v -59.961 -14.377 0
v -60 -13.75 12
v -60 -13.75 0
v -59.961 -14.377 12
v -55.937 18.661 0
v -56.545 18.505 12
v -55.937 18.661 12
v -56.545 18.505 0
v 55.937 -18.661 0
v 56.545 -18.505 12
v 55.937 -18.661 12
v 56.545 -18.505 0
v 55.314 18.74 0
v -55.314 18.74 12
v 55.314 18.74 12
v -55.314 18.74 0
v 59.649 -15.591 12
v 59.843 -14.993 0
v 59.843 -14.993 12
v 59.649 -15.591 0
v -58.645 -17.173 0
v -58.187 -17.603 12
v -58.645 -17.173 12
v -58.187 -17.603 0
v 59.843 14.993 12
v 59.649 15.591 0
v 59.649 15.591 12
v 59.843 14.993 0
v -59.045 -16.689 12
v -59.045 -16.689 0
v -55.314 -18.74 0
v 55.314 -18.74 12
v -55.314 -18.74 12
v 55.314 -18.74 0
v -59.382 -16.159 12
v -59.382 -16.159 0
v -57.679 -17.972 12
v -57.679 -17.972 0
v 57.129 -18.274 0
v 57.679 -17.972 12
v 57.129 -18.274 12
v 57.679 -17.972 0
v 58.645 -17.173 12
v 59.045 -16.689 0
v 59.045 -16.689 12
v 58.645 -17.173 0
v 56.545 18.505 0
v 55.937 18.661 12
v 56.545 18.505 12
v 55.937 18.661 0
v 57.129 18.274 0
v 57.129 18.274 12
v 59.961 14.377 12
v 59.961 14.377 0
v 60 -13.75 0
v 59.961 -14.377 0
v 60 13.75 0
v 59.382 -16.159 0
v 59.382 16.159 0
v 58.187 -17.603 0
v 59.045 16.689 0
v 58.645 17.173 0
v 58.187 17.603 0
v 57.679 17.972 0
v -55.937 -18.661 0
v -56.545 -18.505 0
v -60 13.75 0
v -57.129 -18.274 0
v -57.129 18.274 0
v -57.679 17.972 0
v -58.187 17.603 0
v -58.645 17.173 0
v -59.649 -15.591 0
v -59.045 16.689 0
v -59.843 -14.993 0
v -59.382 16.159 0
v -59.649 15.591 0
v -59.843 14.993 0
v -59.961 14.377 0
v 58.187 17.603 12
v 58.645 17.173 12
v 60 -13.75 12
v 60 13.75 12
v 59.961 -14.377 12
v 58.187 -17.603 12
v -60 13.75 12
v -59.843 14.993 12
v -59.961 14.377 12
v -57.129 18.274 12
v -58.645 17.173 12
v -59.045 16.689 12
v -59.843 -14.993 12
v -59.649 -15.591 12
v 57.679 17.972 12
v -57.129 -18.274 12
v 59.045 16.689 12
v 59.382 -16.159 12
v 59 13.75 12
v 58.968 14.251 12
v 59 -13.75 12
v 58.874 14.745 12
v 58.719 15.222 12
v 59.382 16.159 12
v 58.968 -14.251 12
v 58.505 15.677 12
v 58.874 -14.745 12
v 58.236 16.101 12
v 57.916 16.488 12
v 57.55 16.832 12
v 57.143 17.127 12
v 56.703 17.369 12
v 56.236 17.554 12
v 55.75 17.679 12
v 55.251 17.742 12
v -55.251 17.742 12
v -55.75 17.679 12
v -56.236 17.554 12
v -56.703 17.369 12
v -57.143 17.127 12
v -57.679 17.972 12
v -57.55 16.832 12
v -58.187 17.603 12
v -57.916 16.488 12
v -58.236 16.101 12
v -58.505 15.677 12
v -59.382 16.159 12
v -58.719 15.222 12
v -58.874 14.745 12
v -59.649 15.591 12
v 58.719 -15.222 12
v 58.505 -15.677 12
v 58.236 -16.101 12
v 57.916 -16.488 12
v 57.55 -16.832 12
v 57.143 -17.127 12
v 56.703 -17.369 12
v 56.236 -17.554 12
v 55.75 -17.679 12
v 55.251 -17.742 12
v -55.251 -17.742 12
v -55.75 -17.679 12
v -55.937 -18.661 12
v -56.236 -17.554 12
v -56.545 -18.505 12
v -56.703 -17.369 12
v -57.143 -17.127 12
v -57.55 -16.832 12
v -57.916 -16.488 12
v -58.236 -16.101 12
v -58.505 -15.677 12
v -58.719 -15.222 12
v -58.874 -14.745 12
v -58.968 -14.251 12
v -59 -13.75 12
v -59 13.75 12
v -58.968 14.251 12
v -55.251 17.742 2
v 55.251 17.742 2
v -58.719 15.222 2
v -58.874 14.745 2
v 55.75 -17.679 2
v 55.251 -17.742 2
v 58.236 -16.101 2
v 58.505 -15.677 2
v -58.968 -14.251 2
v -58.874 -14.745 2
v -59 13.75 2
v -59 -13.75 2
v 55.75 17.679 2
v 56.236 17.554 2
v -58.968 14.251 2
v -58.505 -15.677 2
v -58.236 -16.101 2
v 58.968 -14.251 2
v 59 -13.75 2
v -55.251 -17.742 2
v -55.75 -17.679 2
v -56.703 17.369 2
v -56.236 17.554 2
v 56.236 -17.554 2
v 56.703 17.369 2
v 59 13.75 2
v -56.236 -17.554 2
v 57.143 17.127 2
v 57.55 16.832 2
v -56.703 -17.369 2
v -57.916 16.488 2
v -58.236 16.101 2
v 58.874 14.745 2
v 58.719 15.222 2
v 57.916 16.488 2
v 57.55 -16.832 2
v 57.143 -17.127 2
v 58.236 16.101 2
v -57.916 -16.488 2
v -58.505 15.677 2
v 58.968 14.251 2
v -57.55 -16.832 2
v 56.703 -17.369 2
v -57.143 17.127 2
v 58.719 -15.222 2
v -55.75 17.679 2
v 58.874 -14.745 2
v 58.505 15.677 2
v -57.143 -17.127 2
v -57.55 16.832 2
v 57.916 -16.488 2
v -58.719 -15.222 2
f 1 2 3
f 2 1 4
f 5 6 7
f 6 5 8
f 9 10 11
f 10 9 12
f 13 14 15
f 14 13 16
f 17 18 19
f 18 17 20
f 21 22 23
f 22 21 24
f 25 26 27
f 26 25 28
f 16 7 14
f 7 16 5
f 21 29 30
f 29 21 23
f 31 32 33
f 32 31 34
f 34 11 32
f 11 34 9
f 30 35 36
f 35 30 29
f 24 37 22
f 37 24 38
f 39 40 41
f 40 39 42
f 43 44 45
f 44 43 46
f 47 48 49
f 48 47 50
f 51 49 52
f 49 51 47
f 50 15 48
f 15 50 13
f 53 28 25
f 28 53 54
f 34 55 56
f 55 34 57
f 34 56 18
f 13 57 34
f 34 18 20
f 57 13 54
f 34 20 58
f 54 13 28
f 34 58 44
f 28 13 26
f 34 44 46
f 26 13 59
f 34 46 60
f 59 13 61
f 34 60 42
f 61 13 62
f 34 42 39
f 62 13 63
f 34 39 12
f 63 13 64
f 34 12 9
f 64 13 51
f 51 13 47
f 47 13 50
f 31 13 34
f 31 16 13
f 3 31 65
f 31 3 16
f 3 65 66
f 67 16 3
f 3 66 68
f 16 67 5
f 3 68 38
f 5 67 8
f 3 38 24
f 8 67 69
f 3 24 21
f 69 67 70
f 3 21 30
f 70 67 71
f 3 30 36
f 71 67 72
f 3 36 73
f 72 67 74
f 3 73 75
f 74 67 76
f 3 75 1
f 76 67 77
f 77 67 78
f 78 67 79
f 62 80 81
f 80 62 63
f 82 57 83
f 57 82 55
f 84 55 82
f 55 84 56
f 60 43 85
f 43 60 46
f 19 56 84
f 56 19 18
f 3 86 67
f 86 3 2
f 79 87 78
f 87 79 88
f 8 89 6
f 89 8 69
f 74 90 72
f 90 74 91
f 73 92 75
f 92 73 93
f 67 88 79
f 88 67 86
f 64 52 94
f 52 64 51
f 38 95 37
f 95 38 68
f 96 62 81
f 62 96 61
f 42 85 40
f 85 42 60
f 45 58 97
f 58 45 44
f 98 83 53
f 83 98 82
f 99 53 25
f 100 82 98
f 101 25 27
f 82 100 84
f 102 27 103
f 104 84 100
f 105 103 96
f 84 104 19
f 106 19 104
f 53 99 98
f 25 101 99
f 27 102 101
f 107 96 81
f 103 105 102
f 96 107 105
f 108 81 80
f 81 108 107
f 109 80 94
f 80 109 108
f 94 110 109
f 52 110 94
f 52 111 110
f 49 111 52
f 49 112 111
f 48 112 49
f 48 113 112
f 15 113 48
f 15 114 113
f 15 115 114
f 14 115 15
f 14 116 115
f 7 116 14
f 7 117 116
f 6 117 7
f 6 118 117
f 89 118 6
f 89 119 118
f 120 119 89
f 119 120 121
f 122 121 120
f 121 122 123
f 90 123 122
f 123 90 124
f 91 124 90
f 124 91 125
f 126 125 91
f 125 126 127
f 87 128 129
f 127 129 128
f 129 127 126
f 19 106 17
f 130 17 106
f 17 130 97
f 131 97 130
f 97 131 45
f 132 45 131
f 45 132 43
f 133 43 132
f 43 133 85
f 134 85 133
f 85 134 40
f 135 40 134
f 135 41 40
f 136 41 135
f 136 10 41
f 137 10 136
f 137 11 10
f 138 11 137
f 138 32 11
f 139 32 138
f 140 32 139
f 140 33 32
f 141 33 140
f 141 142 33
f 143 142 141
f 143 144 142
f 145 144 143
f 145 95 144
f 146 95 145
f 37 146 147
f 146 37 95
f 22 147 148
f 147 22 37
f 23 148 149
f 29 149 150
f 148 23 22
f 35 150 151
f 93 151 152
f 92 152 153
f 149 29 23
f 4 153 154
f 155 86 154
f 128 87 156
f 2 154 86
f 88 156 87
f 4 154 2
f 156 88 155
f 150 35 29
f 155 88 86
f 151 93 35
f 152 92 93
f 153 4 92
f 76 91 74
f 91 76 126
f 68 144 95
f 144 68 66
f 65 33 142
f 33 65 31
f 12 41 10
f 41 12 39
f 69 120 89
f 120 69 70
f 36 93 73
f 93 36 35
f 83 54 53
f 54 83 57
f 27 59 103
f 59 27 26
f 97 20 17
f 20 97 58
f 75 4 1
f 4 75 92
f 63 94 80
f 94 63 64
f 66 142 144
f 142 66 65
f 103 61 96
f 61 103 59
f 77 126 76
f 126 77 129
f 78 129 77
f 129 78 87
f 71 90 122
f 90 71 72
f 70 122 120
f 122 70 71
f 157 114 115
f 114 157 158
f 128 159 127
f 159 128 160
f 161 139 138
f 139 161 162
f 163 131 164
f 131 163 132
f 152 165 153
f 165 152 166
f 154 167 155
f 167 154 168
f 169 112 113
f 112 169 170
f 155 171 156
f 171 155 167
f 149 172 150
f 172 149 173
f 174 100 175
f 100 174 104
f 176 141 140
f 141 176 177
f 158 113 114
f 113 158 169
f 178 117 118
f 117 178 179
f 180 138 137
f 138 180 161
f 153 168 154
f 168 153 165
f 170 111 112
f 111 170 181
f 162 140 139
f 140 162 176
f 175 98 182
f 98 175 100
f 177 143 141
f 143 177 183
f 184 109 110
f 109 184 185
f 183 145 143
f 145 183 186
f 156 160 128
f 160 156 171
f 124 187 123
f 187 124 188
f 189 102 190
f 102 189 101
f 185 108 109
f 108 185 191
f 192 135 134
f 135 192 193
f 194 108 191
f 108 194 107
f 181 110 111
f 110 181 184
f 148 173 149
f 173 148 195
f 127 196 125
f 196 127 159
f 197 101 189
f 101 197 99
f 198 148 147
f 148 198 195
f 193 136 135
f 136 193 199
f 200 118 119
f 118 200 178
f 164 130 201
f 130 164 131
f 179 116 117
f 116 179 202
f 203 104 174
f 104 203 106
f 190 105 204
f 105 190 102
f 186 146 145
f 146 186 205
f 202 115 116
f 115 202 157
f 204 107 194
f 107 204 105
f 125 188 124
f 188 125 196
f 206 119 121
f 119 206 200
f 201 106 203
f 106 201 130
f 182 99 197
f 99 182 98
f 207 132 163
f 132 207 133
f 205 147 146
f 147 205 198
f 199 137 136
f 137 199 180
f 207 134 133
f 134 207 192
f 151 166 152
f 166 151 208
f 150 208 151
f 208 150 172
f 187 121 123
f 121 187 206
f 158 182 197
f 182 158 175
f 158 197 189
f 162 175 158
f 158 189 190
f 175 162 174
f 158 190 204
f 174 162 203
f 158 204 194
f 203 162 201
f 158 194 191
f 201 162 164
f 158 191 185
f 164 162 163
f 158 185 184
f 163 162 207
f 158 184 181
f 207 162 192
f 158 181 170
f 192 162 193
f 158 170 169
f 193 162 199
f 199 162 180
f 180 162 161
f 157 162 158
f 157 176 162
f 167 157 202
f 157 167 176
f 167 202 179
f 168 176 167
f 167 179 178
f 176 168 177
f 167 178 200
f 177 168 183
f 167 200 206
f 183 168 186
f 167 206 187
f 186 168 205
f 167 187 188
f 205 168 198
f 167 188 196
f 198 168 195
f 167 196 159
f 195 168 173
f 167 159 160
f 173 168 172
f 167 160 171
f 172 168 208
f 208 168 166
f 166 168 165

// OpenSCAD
$fn = 50;


difference() {
	union() {
		hull() {
			translate(v = [-55.0000000000, 13.7500000000, 0]) {
				cylinder(h = 12, r = 5);
			}
			translate(v = [55.0000000000, 13.7500000000, 0]) {
				cylinder(h = 12, r = 5);
			}
			translate(v = [-55.0000000000, -13.7500000000, 0]) {
				cylinder(h = 12, r = 5);
			}
			translate(v = [55.0000000000, -13.7500000000, 0]) {
				cylinder(h = 12, r = 5);
			}
		}
	}
	union() {
		translate(v = [0, 0, 2]) {
			hull() {
				translate(v = [-55.0000000000, 13.7500000000, 0]) {
					cylinder(h = 10, r = 4);
				}
				translate(v = [55.0000000000, 13.7500000000, 0]) {
					cylinder(h = 10, r = 4);
				}
				translate(v = [-55.0000000000, -13.7500000000, 0]) {
					cylinder(h = 10, r = 4);
				}
				translate(v = [55.0000000000, -13.7500000000, 0]) {
					cylinder(h = 10, r = 4);
				}
			}
		}
	}
}
